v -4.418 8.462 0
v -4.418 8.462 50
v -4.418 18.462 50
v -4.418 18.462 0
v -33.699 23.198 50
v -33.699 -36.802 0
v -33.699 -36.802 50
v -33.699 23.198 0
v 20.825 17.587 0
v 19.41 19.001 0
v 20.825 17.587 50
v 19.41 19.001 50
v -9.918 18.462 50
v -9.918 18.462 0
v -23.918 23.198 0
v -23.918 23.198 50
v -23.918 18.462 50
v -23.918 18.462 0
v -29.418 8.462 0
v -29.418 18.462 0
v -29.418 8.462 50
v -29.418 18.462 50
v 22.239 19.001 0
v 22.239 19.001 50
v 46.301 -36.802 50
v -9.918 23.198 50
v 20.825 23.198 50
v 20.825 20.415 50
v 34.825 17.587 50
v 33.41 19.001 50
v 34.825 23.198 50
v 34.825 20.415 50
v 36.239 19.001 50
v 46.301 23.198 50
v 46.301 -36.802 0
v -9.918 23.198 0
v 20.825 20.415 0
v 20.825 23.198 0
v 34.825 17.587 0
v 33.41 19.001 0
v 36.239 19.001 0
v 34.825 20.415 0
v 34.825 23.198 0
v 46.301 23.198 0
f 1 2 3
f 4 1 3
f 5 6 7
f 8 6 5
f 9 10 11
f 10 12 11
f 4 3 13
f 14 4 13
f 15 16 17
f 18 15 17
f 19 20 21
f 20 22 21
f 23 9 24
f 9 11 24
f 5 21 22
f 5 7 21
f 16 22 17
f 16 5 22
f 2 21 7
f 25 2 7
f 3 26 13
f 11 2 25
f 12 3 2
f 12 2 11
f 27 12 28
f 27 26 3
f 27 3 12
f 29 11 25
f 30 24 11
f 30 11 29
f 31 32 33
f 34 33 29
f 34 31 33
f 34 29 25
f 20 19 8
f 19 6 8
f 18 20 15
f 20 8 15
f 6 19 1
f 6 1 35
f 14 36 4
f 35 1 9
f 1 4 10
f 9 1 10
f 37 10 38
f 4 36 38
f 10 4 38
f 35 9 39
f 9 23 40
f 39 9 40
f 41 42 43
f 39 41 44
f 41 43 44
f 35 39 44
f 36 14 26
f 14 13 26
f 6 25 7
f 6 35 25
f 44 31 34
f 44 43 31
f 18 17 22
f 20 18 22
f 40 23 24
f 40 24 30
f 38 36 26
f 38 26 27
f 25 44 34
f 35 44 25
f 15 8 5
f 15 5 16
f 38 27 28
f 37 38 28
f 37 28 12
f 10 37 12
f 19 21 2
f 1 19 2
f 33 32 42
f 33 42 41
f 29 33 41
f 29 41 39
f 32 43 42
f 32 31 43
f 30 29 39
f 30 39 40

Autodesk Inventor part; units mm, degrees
ref_plane "YZ Plane" through (0, 0, 0) normal (1, 0, 0) x (0, 1, 0)
ref_plane "XZ Plane" through (0, 0, 0) normal (0, 1, 0) x (-1, 0, 0)
ref_plane "XY Plane" through (0, 0, 0) normal (0, 0, 1) x (1, 0, 0)
sketch "Sketch1" plane through (0, 0, 0) normal (0, 0, 1) x (1, 0, 0)
  line L0 (-33.6993, 23.1981) -> (46.3007, 23.1981)
  line L1 (46.3007, 23.1981) -> (46.3007, -36.8019)
  line L2 (46.3007, -36.8019) -> (-33.6993, -36.8019)
  line L3 (-33.6993, -36.8019) -> (-33.6993, 23.1981)
  point P0 (0, 0)
  dimension "d0" = 80
  dimension "d1" = 60
extrude "Extrusion1" add sketch "Sketch1" along normal blind 50
sketch "Sketch2" plane through (0, 0, 50) normal (0, 0, 1) x (1, 0, 0)
  line L0 (-23.918, 27.4616) -> (-23.918, 18.4616)
  line L1 (-23.918, 18.4616) -> (-29.418, 18.4616)
  line L2 (-29.418, 18.4616) -> (-29.418, 8.4616)
  line L3 (-29.418, 8.4616) -> (-4.418, 8.4616)
  line L4 (-4.418, 8.4616) -> (-4.418, 18.4616)
  line L5 (-4.418, 18.4616) -> (-9.918, 18.4616)
  line L6 (-9.918, 18.4616) -> (-9.918, 27.4616)
  line L7 (-9.918, 27.4616) -> (-23.918, 27.4616)
  point P0 (0, 0)
  point P1 (-16.918, 27.4616)
  dimension "d4" = 14
  dimension "d5" = 10
  dimension "d6" = 25
  dimension "d7" = 9
  dimension "d8" = 7
  dimension "d9" = 12.5
extrude "Extrusion2" cut sketch "Sketch2" against normal blind 50
sketch "Sketch3" plane through (0, 0, 50) normal (0, 0, 1) x (1, 0, 0)
  line L0 (27.8246, 24.0009) -> (34.8246, 24.0009)
  line L1 (34.8246, 24.0009) -> (34.8246, 20.4151)
  line L2 (34.8246, 20.4151) -> (36.2388, 19.0009)
  line L3 (36.2388, 19.0009) -> (34.8246, 17.5867)
  line L4 (34.8246, 17.5867) -> (33.4104, 19.0009)
  line L5 (33.4104, 19.0009) -> (27.8246, 19.0009)
  line L6 (27.8246, 24.0009) -> (27.8246, 19.0009) construction
  line L7 (27.8246, 24.0009) -> (20.8246, 24.0009)
  line L8 (20.8246, 24.0009) -> (20.8246, 20.4151)
  line L9 (20.8246, 20.4151) -> (19.4104, 19.0009)
  line L10 (19.4104, 19.0009) -> (20.8246, 17.5867)
  line L11 (20.8246, 17.5867) -> (22.2388, 19.0009)
  line L12 (22.2388, 19.0009) -> (27.8246, 19.0009)
  point P0 (0, 0)
  dimension "d12" = 2
  dimension "d13" = 7
  dimension "d14" = 5
  dimension "d15" = 135
  dimension "d16" = 2
extrude "Extrusion3" cut sketch "Sketch3" against normal blind 50
